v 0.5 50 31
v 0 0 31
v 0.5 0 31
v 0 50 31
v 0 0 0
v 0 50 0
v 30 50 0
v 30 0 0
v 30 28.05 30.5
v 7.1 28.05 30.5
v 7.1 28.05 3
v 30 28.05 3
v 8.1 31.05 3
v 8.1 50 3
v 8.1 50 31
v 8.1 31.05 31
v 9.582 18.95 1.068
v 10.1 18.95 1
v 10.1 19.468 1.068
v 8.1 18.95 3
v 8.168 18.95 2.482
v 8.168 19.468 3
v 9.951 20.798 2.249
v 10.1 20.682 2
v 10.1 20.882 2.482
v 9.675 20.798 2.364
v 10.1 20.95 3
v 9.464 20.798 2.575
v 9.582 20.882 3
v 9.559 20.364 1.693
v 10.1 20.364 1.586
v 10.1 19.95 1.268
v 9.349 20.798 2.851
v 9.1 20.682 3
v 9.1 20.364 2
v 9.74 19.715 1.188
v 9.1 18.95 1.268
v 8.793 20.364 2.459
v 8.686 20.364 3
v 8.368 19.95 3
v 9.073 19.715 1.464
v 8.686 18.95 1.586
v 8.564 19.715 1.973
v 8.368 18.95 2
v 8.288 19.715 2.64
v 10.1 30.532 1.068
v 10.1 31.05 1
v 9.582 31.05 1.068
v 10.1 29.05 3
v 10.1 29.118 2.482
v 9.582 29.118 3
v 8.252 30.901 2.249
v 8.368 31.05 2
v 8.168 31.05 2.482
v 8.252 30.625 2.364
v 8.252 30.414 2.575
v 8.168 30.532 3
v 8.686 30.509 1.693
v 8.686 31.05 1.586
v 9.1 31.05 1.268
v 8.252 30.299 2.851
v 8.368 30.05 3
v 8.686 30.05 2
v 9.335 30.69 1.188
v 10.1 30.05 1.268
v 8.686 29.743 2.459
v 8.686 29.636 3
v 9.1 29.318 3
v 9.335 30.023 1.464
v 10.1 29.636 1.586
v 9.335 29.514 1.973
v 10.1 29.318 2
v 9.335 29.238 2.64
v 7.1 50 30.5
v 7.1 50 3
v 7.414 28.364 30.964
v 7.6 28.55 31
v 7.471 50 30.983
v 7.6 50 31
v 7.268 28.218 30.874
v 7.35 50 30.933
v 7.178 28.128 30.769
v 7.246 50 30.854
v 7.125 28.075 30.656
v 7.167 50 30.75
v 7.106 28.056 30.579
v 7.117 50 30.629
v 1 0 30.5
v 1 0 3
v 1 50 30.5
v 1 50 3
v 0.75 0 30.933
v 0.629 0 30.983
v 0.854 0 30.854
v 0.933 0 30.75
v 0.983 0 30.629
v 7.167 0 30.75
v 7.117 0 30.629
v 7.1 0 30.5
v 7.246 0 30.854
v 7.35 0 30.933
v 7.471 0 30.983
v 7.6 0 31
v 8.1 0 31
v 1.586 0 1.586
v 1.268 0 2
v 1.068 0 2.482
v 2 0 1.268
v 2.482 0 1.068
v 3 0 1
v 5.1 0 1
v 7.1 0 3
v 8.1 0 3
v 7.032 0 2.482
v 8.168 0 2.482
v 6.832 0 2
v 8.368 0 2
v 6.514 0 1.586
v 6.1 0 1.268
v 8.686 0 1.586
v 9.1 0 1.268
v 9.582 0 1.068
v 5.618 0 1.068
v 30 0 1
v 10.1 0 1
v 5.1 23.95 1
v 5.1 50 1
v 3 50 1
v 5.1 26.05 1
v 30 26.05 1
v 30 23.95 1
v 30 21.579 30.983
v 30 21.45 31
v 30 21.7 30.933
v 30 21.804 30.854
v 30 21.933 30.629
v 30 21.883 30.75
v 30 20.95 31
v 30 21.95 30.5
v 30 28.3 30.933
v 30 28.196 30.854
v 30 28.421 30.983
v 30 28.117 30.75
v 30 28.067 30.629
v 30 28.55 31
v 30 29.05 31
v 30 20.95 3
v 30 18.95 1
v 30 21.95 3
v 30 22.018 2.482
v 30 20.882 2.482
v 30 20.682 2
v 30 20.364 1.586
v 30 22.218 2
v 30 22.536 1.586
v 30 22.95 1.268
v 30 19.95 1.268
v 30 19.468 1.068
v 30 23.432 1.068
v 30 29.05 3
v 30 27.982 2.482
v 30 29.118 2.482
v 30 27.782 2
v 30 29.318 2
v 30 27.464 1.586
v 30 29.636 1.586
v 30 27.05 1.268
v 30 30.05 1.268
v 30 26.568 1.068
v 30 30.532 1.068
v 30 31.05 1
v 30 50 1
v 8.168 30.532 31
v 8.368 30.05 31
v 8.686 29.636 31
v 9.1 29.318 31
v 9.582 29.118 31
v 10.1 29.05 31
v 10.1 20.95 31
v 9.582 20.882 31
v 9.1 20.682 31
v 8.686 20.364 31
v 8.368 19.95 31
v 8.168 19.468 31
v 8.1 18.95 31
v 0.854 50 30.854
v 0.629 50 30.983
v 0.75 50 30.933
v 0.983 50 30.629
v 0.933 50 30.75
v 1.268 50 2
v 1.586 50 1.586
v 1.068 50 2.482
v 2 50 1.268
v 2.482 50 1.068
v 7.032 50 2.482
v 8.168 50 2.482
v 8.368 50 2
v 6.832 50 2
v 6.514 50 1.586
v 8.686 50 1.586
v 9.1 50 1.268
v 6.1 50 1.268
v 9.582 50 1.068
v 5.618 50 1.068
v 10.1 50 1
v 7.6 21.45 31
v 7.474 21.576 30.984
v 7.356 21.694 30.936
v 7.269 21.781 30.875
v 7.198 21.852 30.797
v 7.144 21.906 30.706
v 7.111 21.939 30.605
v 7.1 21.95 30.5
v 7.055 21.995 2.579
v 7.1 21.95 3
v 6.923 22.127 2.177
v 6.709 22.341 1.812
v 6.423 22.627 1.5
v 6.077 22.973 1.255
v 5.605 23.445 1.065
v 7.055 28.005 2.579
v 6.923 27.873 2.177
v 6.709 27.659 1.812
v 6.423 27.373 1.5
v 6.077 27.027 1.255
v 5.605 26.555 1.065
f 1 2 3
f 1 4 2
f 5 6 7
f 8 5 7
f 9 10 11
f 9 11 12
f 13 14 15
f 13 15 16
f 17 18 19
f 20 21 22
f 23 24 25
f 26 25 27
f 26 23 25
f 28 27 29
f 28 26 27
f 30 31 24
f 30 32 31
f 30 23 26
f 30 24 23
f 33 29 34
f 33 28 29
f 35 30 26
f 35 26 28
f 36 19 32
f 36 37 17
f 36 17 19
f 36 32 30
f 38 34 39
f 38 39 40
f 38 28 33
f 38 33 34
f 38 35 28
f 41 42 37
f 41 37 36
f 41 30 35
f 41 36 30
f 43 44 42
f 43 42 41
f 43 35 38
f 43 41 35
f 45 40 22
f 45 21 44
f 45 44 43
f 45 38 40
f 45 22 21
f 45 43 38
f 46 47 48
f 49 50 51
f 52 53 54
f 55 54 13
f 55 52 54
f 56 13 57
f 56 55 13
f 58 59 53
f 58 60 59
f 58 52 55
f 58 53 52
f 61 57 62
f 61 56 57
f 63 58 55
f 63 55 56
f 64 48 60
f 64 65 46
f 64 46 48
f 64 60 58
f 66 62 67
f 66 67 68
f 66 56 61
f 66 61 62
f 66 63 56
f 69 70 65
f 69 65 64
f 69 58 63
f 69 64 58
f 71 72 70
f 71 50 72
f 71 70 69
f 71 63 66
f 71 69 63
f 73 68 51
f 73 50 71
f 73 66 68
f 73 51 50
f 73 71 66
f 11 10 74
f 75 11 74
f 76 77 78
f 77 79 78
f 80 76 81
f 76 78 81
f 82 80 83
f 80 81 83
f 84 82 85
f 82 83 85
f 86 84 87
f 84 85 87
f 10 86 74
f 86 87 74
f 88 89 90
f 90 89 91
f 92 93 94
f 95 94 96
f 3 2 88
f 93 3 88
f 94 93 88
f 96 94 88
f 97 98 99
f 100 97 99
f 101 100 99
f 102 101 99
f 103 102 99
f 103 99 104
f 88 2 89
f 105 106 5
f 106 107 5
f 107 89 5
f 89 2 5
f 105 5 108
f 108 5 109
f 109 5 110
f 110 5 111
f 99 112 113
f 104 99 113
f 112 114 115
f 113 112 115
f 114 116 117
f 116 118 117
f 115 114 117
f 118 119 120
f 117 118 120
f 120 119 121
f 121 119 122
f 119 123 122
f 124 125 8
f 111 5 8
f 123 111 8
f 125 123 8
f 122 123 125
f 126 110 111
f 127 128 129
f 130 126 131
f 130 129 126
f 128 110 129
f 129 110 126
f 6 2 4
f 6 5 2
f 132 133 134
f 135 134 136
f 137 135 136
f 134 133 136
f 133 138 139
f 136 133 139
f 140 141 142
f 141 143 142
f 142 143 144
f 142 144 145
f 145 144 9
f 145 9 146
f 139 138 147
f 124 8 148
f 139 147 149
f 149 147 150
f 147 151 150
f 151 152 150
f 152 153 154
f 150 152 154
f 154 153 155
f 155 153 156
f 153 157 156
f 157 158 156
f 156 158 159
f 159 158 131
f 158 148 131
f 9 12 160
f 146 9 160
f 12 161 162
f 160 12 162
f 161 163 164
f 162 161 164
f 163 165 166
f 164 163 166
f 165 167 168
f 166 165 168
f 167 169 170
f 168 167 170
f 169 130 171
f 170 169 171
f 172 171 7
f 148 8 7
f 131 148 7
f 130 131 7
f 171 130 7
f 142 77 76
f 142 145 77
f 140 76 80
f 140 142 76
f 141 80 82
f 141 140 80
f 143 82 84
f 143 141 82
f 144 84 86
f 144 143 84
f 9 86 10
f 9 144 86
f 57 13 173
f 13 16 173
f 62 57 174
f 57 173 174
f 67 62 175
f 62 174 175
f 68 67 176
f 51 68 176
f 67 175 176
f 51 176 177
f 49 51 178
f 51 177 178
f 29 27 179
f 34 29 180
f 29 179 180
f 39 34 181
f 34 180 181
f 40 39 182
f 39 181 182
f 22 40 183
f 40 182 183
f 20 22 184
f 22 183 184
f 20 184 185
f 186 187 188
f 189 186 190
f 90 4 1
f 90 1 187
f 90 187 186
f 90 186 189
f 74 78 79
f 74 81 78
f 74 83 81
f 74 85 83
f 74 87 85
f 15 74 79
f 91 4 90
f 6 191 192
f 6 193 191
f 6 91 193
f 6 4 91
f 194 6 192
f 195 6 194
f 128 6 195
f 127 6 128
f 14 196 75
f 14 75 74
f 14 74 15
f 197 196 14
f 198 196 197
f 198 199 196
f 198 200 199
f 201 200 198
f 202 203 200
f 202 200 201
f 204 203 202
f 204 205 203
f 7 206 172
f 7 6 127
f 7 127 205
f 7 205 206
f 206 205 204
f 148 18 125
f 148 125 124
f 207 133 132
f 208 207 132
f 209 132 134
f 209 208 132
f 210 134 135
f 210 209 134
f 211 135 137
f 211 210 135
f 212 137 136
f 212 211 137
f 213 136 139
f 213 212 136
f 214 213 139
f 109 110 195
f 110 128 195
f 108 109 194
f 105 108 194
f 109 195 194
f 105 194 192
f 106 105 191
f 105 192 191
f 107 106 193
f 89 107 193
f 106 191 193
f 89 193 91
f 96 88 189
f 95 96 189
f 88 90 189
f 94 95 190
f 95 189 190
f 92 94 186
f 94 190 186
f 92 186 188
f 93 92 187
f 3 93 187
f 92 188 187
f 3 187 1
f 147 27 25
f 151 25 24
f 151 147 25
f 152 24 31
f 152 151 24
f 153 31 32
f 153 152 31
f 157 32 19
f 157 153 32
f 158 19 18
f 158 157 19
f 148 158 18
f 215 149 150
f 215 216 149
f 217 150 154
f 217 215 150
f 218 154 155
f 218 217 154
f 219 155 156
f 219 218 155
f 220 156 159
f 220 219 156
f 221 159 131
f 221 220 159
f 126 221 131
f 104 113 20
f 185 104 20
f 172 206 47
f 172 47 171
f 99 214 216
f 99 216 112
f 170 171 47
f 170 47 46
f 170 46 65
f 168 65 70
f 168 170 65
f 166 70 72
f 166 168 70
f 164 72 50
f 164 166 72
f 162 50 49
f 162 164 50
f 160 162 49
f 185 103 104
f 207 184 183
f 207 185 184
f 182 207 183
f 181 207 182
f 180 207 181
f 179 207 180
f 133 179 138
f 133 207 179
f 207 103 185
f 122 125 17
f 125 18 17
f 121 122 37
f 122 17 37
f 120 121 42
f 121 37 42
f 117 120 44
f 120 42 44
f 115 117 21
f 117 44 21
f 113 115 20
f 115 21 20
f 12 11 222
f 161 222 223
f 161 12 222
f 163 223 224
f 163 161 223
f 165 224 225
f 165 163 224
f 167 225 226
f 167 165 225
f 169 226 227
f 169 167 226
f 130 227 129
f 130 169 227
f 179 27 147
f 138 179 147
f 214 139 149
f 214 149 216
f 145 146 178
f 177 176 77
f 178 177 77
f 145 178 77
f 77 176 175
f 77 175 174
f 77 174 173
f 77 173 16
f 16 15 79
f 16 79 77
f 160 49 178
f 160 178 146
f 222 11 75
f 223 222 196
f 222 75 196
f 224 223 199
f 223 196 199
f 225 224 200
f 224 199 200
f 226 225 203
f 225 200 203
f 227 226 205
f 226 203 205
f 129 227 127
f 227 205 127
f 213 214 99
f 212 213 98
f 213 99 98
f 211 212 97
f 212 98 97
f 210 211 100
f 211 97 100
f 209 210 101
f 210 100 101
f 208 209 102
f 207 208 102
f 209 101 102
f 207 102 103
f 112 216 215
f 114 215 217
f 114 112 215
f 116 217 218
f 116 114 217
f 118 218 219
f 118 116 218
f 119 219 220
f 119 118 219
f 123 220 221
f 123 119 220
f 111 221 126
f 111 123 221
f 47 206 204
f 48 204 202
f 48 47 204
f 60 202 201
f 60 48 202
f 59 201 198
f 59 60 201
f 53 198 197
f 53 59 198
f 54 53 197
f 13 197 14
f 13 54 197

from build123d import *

# Parameters (mm, degrees)
SKETCH1_W           = 30
SKETCH1_H           = 50
BOSS_EXTRUDE1_DEPTH = 1
SKETCH2_W           = 1
SKETCH2_H           = 50
BOSS_EXTRUDE2_DEPTH = 30
FILLET4_R           = 2
FILLET5_R           = 0.5


with BuildPart() as part:
    # Sketch1 → Boss-Extrude1 (new body)
    with BuildSketch(Plane.XY):
        with Locations((15, 25)):
            Rectangle(SKETCH1_W, SKETCH1_H)
    extrude(amount=BOSS_EXTRUDE1_DEPTH)

    # Sketch2 → Boss-Extrude2 (add)
    with BuildSketch(Plane.XY.offset(1)):
        Polygon((7.1, 0), (8.1, 0), (8.1, 20.95), (30, 20.95), (30, 21.95), (8.1, 21.95), (7.1, 21.95), align=None)
        with Locations((0.5, 25)):
            Rectangle(SKETCH2_W, SKETCH2_H)
        Polygon((7.1, 50), (8.1, 50), (8.1, 29.05), (30, 29.05), (30, 28.05), (8.1, 28.05), (7.1, 28.05), align=None)
    extrude(amount=BOSS_EXTRUDE2_DEPTH)

    # Fillet4
    fillet4_edges = [part.edges().sort_by_distance(p)[0] for p in [
        (1, 25, 1),
        (7.1, 10.975, 1),
        (8.1, 10.475, 1),
        (19.05, 20.95, 1),
        (8.1, 20.95, 16),
        (18.55, 21.95, 1),
        (7.1, 39.025, 1),
        (18.55, 28.05, 1),
        (19.05, 29.05, 1),
        (8.1, 39.525, 1),
        (8.1, 29.05, 16),
    ]]
    fillet(fillet4_edges, radius=FILLET4_R)

    # Fillet5
    fillet5_edges = [part.edges().sort_by_distance(p)[0] for p in [
        (1, 25, 31),
        (7.1, 10.975, 31),
        (18.55, 21.95, 31),
        (7.1, 39.025, 31),
        (18.55, 28.05, 31),
    ]]
    fillet(fillet5_edges, radius=FILLET5_R)


solid = part.part
